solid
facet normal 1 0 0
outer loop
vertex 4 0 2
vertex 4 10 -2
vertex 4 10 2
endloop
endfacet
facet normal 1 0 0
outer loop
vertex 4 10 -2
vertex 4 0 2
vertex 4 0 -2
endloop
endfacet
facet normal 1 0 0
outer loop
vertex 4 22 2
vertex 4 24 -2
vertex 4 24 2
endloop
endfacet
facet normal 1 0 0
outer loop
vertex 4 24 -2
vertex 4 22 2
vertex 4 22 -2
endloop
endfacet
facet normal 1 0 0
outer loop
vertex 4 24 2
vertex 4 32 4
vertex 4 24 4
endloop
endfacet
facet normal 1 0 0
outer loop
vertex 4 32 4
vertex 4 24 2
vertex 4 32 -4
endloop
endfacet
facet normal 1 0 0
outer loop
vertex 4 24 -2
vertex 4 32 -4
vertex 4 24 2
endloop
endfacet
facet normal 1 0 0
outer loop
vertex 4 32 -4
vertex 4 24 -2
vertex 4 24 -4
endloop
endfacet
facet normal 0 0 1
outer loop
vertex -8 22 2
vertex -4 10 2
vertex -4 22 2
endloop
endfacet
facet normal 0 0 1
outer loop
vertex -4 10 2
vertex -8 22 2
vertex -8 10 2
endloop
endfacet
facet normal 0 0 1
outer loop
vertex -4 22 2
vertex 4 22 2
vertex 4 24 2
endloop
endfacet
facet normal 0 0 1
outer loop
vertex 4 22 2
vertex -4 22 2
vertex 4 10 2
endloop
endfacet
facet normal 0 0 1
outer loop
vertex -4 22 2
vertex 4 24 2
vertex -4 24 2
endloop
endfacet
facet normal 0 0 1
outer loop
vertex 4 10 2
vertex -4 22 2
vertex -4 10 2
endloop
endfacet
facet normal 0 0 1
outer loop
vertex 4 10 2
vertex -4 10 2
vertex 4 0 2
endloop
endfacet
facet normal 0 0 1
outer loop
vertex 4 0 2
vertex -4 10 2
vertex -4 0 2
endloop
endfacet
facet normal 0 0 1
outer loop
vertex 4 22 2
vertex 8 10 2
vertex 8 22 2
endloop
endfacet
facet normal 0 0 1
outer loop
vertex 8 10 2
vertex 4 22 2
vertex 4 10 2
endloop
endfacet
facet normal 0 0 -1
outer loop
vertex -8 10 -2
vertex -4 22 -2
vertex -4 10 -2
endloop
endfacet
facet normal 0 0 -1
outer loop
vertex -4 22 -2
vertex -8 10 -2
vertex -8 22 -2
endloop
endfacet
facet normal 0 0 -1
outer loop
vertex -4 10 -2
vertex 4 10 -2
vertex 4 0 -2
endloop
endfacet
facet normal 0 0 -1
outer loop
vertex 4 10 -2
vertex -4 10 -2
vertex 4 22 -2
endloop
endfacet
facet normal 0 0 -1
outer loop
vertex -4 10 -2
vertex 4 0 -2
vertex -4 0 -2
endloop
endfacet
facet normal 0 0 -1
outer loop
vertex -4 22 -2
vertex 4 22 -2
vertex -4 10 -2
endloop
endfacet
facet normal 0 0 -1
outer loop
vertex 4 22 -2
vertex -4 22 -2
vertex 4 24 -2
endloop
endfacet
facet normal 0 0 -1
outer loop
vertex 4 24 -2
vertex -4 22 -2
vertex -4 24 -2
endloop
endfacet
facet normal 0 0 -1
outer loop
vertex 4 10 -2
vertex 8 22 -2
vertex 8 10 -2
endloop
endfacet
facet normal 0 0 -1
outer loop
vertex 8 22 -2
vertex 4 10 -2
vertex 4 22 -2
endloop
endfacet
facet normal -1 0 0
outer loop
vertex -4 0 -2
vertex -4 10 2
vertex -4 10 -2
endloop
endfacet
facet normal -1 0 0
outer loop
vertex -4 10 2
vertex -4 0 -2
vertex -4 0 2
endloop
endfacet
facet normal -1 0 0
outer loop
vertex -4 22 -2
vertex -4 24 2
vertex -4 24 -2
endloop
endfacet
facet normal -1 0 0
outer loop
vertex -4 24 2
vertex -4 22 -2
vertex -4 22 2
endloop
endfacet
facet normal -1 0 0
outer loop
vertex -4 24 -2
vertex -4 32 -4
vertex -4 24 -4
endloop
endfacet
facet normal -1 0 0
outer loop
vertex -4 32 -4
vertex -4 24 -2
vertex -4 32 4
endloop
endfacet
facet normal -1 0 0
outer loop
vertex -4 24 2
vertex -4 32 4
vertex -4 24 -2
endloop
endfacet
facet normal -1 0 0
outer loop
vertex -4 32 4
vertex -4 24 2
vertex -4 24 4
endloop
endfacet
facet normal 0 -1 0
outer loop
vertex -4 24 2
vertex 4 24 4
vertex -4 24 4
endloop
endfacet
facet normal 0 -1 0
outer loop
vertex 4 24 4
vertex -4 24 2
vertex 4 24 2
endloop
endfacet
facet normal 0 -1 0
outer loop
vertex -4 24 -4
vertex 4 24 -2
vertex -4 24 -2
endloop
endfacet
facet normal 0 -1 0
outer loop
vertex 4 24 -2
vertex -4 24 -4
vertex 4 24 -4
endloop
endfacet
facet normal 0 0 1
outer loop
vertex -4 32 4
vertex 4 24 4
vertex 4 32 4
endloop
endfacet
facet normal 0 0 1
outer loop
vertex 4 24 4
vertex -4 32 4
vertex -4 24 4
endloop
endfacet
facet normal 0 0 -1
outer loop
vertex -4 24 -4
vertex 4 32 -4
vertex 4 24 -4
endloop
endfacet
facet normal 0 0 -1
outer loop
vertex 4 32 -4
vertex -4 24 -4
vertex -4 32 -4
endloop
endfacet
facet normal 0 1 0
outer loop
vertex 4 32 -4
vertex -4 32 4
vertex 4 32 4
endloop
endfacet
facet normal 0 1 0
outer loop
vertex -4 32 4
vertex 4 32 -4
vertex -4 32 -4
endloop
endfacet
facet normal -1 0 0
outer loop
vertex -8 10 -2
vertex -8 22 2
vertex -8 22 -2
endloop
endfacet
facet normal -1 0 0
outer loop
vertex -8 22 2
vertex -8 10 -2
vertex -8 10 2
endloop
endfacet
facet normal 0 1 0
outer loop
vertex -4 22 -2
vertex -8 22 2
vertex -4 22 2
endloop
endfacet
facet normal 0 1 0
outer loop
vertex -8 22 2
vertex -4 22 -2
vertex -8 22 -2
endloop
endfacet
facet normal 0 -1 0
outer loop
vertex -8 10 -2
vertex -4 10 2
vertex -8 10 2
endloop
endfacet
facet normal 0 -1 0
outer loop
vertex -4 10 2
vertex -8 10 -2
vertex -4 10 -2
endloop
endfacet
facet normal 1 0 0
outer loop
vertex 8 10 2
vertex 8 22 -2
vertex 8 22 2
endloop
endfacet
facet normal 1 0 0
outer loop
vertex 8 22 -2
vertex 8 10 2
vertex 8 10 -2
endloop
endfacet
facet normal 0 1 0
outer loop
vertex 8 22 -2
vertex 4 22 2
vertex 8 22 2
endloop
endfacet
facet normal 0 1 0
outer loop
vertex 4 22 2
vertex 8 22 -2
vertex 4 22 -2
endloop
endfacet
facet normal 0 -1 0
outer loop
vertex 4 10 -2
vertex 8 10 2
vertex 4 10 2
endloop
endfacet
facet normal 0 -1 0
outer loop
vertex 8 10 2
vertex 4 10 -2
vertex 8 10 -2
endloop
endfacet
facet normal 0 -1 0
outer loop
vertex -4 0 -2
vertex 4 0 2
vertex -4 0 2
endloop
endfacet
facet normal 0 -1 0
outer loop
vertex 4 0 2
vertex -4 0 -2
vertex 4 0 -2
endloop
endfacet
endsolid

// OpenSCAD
// file: lib.scad
// Voxcraft box-model library (OpenSCAD).
//
// Conventions: 1 unit = 1 texture pixel = 1/16 block. Origin = entity feet centre. +Y up,
// the model faces -Z (forward). Pivots are in model space.
//
// vx_bone() and vx_box() both produce geometry (so the model can be previewed/rendered and its
// geometry validated) AND echo a machine-readable record that tools/scad_export.py turns into
// the runtime box model. The .scad files are the single editable source of truth.

// Declare a bone: name, parent ("" = root), pivot point the bone rotates around.
module vx_bone(name, parent, pivot) {
    echo("VXBONE", name, parent, pivot);
    %translate(pivot) sphere(0.5, $fn = 6);   // preview-only marker
}

// A textured box attached to a bone. tex: texture for all faces; front: texture for the -Z face.
module vx_box(bone, min, size, tex, front = "") {
    echo("VXBOX", bone, min, size, tex, front == "" ? tex : front);
    translate(min) cube(size);
}
// main file
// Wanderer: the player character, seen in third-person views. Original Voxcraft character:
// a traveller in a teal tunic with a satchel strap, cropped dark hair and sturdy boots.
include <lib.scad>

vx_bone("body", "", [0, 12, 0]);
vx_bone("head", "body", [0, 24, 0]);
vx_bone("arm_l", "body", [-6, 22, 0]);
vx_bone("arm_r", "body", [ 6, 22, 0]);
vx_bone("leg_l", "body", [-2, 12, 0]);
vx_bone("leg_r", "body", [ 2, 12, 0]);

vx_box("body", [-4, 12, -2], [8, 12, 4], "wanderer_tunic", "wanderer_tunic_front");
vx_box("head", [-4, 24, -4], [8, 8, 8], "wanderer_hair", "wanderer_face");
vx_box("arm_l", [-8, 10, -2], [4, 12, 4], "wanderer_sleeve");
vx_box("arm_r", [ 4, 10, -2], [4, 12, 4], "wanderer_sleeve");
vx_box("leg_l", [-4, 0, -2], [4, 12, 4], "wanderer_trousers");
vx_box("leg_r", [ 0, 0, -2], [4, 12, 4], "wanderer_trousers");
